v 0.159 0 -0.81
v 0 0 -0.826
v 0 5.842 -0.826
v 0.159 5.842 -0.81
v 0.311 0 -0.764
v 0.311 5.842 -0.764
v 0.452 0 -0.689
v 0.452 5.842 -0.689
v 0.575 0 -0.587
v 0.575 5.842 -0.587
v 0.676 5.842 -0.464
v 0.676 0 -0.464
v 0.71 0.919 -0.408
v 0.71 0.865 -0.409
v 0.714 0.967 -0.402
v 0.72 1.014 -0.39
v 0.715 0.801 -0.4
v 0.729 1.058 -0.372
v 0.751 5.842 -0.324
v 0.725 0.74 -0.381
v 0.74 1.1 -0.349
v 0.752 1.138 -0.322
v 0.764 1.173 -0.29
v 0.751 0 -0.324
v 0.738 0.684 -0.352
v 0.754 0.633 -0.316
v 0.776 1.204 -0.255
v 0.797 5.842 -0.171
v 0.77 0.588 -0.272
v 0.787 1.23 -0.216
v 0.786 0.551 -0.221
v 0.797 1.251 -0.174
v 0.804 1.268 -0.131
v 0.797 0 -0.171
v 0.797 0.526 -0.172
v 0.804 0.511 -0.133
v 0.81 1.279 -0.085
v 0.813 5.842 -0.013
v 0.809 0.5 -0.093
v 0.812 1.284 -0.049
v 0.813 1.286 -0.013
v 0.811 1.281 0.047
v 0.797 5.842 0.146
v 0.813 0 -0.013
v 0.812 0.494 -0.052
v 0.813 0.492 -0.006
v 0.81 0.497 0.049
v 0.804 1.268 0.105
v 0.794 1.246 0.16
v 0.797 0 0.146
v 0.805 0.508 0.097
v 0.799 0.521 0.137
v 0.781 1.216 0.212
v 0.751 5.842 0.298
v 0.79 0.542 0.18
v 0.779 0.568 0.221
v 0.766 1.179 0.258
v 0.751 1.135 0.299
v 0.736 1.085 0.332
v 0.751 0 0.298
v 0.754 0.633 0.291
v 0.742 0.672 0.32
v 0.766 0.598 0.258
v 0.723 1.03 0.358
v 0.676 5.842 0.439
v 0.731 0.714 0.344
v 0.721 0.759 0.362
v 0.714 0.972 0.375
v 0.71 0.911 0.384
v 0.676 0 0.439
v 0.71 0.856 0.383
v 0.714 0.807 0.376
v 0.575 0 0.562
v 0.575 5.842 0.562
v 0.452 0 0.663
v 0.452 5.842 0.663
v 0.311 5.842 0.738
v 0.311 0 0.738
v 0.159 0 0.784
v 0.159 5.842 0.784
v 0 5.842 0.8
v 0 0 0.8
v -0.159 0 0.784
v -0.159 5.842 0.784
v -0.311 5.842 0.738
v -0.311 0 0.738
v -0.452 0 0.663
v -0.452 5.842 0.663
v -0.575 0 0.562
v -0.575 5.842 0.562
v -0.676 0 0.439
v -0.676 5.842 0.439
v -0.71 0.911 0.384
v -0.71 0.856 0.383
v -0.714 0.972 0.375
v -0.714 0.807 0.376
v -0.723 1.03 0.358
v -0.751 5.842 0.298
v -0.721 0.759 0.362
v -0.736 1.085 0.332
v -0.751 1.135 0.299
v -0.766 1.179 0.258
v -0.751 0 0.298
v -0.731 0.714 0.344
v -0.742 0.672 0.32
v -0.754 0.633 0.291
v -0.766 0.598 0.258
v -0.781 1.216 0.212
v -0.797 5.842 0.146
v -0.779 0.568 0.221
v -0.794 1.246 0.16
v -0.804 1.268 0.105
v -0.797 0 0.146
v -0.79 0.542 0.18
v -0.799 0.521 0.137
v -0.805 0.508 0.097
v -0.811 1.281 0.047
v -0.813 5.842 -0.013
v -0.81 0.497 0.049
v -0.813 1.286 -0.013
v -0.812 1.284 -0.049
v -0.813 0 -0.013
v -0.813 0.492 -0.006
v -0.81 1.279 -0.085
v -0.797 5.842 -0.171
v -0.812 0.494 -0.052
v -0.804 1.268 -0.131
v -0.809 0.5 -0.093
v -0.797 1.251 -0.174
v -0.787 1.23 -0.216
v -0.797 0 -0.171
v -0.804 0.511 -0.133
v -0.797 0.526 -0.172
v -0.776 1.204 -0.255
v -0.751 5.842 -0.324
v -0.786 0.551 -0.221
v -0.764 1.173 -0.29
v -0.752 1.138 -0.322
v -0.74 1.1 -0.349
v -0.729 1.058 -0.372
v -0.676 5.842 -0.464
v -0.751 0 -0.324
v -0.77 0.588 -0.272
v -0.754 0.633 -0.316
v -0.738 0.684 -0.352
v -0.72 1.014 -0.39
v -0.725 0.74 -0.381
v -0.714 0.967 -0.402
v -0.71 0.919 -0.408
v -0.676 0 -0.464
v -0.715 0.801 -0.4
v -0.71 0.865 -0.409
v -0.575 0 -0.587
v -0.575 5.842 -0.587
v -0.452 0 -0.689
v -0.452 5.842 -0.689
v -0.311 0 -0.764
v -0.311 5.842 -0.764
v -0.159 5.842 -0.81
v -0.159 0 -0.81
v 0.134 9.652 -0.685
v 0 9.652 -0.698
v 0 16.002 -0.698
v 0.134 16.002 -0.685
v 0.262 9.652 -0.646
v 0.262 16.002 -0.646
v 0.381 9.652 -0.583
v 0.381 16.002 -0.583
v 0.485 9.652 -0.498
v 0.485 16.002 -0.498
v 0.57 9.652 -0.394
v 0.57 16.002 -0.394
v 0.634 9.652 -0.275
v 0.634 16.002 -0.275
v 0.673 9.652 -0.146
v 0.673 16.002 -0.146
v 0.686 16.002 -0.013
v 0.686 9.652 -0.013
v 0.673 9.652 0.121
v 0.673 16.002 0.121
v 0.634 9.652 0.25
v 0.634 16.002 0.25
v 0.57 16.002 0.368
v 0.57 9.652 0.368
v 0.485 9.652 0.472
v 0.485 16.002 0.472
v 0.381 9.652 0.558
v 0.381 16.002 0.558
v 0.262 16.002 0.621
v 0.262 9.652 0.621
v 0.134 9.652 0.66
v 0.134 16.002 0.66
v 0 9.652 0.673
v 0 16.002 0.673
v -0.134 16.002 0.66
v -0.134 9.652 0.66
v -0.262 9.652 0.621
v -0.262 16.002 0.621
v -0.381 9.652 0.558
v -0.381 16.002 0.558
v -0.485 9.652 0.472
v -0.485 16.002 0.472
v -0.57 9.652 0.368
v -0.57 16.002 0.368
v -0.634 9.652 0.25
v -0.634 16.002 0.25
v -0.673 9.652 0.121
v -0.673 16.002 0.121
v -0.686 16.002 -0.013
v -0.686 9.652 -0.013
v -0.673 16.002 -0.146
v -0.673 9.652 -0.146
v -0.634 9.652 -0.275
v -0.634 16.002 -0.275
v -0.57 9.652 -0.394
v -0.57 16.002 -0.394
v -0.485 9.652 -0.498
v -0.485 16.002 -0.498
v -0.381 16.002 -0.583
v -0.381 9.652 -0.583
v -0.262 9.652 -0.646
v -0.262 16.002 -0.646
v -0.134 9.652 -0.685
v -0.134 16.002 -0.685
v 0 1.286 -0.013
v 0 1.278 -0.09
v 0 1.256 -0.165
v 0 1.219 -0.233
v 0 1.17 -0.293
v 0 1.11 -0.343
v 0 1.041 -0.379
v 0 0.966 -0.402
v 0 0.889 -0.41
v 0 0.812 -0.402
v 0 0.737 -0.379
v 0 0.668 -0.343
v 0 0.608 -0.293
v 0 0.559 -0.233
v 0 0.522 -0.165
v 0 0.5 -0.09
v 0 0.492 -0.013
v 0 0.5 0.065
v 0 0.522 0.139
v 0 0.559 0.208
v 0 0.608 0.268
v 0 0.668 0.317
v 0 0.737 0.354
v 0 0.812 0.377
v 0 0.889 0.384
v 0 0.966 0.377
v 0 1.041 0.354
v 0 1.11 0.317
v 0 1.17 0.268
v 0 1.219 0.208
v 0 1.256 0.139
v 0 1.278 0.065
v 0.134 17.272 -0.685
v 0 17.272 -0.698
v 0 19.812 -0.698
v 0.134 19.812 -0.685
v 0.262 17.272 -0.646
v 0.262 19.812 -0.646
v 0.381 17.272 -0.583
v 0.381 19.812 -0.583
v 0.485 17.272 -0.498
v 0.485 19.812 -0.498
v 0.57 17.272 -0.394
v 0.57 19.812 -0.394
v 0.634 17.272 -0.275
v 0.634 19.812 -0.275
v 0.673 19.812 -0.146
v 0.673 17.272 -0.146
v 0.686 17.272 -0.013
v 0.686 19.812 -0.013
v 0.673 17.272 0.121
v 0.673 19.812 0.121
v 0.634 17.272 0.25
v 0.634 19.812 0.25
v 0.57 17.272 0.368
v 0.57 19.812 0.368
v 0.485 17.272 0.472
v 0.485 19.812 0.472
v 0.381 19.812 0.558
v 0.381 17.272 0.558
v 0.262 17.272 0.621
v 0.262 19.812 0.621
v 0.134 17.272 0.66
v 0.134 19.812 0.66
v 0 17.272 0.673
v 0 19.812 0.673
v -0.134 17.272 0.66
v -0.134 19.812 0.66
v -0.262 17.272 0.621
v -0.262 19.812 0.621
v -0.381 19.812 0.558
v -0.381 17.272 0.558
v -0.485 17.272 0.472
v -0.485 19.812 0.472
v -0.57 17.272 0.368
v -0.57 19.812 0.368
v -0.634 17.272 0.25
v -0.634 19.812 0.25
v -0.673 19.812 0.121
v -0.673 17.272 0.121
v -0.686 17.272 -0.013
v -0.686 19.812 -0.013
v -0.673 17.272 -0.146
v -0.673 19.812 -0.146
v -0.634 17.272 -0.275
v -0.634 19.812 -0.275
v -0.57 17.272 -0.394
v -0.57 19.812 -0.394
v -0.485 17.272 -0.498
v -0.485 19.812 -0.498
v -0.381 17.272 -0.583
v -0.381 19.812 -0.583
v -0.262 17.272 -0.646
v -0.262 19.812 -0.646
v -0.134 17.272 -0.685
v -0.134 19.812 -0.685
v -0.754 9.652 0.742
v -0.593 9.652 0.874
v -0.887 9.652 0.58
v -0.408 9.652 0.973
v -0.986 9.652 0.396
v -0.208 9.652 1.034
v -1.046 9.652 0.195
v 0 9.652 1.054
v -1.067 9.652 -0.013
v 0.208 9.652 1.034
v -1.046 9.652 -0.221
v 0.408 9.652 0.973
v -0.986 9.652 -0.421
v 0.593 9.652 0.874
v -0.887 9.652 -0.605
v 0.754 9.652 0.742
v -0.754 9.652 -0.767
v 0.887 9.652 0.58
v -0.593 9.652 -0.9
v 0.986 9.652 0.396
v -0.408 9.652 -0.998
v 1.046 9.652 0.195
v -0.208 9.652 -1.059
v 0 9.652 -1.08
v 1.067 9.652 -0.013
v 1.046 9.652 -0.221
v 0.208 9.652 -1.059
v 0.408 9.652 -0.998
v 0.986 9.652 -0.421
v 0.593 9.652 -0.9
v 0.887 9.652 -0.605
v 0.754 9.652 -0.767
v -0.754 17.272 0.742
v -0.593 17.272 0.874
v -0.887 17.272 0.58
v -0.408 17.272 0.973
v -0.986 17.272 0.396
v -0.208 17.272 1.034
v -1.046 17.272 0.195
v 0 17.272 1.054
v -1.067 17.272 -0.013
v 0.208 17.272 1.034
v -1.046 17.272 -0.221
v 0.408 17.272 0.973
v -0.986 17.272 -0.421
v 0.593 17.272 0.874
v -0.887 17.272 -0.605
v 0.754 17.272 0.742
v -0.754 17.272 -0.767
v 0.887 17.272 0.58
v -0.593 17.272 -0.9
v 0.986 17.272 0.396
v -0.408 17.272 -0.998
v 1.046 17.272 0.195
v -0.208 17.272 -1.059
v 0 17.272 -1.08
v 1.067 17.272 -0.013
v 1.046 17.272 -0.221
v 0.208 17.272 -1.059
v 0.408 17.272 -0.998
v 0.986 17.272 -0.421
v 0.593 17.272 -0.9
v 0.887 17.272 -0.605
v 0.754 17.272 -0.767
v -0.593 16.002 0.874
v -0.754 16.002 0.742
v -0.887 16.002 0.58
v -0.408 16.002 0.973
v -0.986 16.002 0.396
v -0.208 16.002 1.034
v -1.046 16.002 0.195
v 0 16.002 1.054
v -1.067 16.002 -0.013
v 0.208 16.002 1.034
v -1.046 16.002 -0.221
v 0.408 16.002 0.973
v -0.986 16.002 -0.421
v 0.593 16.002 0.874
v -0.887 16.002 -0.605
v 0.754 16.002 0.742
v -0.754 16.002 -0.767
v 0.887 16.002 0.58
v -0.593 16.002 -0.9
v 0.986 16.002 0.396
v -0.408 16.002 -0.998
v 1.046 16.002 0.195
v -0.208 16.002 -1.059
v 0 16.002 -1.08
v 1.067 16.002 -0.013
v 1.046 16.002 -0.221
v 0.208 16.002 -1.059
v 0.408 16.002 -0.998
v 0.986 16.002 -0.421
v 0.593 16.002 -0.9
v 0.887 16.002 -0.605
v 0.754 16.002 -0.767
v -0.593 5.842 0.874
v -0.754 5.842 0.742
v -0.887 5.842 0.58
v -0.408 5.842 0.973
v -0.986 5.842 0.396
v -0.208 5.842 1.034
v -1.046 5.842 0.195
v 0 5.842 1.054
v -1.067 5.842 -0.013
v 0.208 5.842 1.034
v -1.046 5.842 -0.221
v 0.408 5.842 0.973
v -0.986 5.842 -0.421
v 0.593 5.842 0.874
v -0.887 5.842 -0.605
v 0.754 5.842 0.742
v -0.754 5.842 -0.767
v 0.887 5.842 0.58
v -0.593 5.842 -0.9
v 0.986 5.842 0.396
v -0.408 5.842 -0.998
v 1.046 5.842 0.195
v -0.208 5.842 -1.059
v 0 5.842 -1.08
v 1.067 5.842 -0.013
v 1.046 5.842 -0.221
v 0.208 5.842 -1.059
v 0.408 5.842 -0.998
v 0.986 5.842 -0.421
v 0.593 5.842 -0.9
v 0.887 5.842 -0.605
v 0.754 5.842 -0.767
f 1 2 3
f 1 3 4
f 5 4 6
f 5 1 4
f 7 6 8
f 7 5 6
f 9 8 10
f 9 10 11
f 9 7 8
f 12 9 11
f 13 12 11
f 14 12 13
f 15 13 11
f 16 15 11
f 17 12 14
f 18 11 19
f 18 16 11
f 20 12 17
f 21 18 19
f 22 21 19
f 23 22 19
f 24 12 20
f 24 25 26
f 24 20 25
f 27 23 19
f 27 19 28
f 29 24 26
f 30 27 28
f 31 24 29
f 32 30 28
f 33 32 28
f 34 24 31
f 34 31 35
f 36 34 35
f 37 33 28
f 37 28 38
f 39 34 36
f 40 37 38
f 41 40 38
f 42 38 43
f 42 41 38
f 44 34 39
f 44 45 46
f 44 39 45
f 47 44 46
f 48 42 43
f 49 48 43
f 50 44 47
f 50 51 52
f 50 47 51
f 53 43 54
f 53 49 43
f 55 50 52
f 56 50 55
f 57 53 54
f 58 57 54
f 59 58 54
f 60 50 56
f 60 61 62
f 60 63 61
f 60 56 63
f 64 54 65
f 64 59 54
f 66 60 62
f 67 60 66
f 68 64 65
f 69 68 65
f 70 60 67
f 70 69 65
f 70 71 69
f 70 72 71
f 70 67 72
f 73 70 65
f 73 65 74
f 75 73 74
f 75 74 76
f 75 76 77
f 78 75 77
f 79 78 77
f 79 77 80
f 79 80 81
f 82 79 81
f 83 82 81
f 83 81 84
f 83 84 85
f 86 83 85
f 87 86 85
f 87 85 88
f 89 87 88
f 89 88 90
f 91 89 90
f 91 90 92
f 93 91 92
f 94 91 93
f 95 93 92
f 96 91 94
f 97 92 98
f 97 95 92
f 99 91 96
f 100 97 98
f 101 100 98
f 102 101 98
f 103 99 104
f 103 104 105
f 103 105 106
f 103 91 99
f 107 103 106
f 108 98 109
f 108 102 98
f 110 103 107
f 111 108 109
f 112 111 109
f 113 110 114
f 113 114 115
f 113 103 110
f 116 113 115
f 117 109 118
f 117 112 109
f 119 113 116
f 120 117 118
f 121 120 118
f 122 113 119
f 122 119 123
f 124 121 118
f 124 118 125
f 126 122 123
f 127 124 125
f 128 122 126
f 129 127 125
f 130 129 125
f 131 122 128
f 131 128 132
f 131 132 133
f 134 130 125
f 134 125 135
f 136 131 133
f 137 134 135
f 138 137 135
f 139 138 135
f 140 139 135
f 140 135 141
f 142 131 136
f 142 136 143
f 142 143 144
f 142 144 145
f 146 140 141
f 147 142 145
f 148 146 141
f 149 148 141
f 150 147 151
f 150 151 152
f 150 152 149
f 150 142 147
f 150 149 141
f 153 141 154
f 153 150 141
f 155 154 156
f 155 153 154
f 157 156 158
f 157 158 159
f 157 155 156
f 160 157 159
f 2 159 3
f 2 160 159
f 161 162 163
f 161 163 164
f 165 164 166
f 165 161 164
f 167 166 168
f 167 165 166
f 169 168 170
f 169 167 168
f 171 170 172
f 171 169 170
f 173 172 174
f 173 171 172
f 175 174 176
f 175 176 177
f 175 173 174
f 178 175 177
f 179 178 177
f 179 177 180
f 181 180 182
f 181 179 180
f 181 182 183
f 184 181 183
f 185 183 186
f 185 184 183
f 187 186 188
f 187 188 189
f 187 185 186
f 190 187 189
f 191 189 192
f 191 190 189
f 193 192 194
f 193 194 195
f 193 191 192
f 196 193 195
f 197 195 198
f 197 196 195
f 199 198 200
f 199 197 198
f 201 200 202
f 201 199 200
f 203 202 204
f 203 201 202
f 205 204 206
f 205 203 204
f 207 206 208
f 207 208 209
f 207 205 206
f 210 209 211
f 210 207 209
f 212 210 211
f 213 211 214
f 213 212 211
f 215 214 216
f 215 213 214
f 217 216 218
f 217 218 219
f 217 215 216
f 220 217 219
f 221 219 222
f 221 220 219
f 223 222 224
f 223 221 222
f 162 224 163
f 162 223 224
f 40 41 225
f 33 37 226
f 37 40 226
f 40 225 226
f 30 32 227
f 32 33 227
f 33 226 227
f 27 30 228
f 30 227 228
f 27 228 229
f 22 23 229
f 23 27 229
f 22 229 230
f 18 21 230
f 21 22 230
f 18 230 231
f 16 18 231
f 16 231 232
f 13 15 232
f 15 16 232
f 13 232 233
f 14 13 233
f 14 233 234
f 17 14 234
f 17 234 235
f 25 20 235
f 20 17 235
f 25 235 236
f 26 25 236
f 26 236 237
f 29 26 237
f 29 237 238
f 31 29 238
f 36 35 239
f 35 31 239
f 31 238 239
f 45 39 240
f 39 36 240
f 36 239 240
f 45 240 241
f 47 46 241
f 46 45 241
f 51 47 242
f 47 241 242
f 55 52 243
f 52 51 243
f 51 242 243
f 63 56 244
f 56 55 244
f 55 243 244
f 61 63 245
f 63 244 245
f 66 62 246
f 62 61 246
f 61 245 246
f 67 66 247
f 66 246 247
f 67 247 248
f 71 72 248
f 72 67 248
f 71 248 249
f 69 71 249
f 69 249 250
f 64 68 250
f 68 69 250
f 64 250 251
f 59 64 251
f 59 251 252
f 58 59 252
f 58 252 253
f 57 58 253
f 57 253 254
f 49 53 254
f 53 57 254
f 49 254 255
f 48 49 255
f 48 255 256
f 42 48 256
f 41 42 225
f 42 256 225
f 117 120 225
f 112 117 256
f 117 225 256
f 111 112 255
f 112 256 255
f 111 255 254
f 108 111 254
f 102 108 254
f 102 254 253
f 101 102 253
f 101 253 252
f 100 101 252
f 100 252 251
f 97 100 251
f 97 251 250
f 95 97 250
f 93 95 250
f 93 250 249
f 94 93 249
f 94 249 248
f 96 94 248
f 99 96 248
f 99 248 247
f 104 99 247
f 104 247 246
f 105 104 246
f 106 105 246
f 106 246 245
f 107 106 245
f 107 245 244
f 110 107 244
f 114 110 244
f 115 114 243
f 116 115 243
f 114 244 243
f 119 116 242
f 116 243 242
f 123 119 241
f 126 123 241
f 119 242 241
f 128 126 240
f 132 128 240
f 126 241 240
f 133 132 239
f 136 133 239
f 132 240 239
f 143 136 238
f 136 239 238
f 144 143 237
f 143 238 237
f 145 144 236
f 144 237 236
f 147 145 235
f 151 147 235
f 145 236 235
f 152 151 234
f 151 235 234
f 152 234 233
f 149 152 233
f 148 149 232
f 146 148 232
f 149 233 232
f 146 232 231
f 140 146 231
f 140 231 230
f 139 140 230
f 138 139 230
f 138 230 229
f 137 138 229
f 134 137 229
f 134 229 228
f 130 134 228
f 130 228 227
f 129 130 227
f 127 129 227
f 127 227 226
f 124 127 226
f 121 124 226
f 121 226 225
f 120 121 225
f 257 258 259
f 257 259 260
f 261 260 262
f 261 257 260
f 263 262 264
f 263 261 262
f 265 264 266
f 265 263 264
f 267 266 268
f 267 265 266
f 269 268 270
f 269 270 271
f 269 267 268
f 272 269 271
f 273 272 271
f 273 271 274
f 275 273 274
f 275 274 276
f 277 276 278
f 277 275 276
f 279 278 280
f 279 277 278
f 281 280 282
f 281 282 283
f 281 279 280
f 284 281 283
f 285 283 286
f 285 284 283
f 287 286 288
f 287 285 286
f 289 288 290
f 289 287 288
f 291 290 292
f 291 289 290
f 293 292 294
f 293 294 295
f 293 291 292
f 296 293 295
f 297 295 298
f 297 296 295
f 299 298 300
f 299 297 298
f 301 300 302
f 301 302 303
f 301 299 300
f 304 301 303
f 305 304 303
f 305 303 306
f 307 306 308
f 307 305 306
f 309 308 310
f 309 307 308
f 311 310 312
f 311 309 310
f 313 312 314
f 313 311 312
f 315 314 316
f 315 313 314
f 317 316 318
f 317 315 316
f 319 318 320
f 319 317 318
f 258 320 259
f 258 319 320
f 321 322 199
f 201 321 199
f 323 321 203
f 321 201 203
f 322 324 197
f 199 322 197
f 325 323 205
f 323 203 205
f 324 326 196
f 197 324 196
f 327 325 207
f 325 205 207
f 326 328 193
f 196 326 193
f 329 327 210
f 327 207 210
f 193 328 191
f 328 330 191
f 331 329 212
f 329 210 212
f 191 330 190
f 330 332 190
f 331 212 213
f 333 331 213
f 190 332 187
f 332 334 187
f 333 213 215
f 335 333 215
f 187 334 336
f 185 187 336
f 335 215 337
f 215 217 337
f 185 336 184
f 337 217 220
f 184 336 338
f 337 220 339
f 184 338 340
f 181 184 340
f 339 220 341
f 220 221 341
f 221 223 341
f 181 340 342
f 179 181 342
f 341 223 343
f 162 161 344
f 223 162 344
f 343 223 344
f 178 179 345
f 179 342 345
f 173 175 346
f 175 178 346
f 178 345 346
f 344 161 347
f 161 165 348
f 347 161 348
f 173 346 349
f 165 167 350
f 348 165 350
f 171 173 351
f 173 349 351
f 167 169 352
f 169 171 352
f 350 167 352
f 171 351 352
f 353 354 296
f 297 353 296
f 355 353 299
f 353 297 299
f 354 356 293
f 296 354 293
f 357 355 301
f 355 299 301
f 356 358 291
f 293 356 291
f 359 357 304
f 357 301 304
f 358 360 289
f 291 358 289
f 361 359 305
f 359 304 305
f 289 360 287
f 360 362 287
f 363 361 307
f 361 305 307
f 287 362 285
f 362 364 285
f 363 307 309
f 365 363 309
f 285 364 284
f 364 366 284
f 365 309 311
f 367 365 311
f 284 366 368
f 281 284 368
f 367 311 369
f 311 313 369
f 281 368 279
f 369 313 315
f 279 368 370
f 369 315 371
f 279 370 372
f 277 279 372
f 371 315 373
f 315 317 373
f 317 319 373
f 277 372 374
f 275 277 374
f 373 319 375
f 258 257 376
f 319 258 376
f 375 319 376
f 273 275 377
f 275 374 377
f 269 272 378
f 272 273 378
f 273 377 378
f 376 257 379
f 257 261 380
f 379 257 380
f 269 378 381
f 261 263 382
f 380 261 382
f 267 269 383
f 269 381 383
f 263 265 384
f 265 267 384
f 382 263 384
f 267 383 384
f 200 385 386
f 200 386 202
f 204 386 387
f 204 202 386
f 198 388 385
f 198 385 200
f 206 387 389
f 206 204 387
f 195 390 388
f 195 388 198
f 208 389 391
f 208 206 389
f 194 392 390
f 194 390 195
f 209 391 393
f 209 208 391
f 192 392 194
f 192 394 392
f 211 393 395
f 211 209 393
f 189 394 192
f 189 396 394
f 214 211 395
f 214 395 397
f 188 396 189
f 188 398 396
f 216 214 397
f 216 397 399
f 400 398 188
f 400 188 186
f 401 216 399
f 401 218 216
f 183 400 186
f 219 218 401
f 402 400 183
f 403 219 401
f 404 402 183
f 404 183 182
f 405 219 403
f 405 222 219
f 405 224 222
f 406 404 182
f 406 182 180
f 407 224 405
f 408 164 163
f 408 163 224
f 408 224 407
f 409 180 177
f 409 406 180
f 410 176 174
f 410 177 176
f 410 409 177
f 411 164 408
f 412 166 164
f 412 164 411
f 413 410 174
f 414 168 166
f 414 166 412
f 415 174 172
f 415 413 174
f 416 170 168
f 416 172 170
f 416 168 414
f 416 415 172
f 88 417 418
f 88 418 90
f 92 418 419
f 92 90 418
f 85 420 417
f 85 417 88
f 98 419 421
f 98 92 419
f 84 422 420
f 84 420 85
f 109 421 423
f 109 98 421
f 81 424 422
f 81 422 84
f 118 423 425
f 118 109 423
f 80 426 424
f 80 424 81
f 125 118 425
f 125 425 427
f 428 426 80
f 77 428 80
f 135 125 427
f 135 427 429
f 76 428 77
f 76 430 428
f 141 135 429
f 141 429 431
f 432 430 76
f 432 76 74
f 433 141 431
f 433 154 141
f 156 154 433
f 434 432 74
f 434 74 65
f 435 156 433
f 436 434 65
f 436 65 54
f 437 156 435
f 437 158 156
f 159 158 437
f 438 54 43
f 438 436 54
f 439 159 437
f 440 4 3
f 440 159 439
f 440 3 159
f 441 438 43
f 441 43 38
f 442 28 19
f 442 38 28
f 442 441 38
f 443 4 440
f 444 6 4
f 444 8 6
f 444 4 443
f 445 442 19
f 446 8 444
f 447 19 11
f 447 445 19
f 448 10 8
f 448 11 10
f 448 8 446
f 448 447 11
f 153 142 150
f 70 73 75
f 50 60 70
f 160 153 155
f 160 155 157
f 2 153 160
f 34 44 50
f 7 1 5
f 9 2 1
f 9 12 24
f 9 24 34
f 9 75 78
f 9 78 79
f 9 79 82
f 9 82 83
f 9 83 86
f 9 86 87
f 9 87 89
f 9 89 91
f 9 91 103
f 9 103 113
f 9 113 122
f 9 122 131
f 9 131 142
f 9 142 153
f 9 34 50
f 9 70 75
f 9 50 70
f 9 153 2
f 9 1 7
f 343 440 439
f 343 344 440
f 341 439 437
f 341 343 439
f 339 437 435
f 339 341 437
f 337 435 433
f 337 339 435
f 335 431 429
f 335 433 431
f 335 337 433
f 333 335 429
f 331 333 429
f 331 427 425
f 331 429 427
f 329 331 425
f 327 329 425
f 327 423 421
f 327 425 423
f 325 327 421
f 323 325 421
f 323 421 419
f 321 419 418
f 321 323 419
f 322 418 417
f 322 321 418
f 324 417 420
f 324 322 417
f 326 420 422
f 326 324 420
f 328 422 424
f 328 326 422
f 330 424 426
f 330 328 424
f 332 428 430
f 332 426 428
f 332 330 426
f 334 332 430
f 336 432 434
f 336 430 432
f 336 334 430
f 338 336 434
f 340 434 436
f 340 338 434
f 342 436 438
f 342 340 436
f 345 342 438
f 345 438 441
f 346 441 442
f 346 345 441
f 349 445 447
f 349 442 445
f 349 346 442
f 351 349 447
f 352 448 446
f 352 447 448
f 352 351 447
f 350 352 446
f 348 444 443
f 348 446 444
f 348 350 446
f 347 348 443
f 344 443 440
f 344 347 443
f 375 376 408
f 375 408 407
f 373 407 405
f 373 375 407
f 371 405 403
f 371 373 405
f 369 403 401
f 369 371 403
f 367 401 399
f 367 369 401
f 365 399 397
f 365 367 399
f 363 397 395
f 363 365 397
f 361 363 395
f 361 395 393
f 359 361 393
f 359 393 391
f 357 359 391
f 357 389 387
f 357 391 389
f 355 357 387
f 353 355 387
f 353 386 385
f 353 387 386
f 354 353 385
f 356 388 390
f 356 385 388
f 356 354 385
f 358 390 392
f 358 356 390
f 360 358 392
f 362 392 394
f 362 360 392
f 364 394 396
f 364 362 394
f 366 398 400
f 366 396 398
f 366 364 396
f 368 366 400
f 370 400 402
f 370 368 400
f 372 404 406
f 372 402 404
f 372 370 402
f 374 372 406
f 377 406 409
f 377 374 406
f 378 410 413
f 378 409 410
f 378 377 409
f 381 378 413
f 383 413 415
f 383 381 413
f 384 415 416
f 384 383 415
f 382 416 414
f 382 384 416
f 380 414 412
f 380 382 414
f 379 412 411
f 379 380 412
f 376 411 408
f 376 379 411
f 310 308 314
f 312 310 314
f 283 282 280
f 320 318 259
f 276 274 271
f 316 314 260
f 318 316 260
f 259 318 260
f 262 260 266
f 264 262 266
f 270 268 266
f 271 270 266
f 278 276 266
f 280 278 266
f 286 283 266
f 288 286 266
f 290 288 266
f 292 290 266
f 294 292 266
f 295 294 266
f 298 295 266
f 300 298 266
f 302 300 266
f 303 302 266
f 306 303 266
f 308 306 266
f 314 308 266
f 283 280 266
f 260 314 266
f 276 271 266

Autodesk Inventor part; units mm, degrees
ref_plane "YZ Plane" through (0, 0, 0) normal (1, 0, 0) x (0, 1, 0)
ref_plane "XZ Plane" through (0, 0, 0) normal (0, 1, 0) x (-1, 0, 0)
ref_plane "XY Plane" through (0, 0, 0) normal (0, 0, 1) x (1, 0, 0)
sketch "Sketch1" plane through (0, 0, 0) normal (1, 0, 0) x (0, 1, 0)
  line L0 (19.812, -0.0127) -> (0, -0.0127)
  line L1 (5.842, -0.8255) -> (5.842, -1.0795)
  line L2 (0, -0.0127) -> (0, -0.8255)
  line L3 (5.842, -0.8255) -> (0, -0.8255)
  line L4 (5.842, -1.0795) -> (9.652, -1.0795)
  line L5 (5.842, -1.0795) -> (9.652, -1.0795)
  line L6 (16.002, -1.0795) -> (17.272, -1.0795)
  line L7 (9.652, -1.0795) -> (9.652, -0.6985)
  line L8 (19.812, -0.6985) -> (17.272, -0.6985)
  line L9 (16.002, -0.6985) -> (9.652, -0.6985)
  line L10 (17.272, -1.0795) -> (17.272, -0.6985)
  line L11 (16.002, -0.6985) -> (16.002, -1.0795)
  line L12 (19.812, -0.0127) -> (19.812, -0.6985)
  line L13 (16.637, -1.0795) -> (16.637, -0.0127)
  line L14 (16.637, -0.0127) -> (0.889, -0.0127)
  circle A0 centre (0.889, -0.0127) radius 0.3969
  dimension "d9" = 0.8128
  dimension "d10" = 1.0668
  dimension "d11" = 0.6858
  dimension "d12" = 1.0668
  dimension "d13" = 0.6858
  dimension "d14" = 1.27
  dimension "d15" = 6.35
  dimension "d16" = 3.81
  dimension "d17" = 5.842
  dimension "d18" = 2.54
  dimension "d20" = 15.748
  dimension "d21" = 0.7937
revolve "Revolution1" add sketch "Sketch1" angle 360 about axis through (0, 19.812, -0.0127) along (0, -1, 0) picked at (1.1498, -0.0444) contours L12 L8 L10 L6 L13 L0 | L13 L6 L11 L9 L7 L4 L1 L3 L2 L0 A0 | A0 L0
extrude "Extrusion1" cut sketch "Sketch1" along normal mid plane 25.4 contours A0 L0 | L0 A0
properties part number "Valve"
